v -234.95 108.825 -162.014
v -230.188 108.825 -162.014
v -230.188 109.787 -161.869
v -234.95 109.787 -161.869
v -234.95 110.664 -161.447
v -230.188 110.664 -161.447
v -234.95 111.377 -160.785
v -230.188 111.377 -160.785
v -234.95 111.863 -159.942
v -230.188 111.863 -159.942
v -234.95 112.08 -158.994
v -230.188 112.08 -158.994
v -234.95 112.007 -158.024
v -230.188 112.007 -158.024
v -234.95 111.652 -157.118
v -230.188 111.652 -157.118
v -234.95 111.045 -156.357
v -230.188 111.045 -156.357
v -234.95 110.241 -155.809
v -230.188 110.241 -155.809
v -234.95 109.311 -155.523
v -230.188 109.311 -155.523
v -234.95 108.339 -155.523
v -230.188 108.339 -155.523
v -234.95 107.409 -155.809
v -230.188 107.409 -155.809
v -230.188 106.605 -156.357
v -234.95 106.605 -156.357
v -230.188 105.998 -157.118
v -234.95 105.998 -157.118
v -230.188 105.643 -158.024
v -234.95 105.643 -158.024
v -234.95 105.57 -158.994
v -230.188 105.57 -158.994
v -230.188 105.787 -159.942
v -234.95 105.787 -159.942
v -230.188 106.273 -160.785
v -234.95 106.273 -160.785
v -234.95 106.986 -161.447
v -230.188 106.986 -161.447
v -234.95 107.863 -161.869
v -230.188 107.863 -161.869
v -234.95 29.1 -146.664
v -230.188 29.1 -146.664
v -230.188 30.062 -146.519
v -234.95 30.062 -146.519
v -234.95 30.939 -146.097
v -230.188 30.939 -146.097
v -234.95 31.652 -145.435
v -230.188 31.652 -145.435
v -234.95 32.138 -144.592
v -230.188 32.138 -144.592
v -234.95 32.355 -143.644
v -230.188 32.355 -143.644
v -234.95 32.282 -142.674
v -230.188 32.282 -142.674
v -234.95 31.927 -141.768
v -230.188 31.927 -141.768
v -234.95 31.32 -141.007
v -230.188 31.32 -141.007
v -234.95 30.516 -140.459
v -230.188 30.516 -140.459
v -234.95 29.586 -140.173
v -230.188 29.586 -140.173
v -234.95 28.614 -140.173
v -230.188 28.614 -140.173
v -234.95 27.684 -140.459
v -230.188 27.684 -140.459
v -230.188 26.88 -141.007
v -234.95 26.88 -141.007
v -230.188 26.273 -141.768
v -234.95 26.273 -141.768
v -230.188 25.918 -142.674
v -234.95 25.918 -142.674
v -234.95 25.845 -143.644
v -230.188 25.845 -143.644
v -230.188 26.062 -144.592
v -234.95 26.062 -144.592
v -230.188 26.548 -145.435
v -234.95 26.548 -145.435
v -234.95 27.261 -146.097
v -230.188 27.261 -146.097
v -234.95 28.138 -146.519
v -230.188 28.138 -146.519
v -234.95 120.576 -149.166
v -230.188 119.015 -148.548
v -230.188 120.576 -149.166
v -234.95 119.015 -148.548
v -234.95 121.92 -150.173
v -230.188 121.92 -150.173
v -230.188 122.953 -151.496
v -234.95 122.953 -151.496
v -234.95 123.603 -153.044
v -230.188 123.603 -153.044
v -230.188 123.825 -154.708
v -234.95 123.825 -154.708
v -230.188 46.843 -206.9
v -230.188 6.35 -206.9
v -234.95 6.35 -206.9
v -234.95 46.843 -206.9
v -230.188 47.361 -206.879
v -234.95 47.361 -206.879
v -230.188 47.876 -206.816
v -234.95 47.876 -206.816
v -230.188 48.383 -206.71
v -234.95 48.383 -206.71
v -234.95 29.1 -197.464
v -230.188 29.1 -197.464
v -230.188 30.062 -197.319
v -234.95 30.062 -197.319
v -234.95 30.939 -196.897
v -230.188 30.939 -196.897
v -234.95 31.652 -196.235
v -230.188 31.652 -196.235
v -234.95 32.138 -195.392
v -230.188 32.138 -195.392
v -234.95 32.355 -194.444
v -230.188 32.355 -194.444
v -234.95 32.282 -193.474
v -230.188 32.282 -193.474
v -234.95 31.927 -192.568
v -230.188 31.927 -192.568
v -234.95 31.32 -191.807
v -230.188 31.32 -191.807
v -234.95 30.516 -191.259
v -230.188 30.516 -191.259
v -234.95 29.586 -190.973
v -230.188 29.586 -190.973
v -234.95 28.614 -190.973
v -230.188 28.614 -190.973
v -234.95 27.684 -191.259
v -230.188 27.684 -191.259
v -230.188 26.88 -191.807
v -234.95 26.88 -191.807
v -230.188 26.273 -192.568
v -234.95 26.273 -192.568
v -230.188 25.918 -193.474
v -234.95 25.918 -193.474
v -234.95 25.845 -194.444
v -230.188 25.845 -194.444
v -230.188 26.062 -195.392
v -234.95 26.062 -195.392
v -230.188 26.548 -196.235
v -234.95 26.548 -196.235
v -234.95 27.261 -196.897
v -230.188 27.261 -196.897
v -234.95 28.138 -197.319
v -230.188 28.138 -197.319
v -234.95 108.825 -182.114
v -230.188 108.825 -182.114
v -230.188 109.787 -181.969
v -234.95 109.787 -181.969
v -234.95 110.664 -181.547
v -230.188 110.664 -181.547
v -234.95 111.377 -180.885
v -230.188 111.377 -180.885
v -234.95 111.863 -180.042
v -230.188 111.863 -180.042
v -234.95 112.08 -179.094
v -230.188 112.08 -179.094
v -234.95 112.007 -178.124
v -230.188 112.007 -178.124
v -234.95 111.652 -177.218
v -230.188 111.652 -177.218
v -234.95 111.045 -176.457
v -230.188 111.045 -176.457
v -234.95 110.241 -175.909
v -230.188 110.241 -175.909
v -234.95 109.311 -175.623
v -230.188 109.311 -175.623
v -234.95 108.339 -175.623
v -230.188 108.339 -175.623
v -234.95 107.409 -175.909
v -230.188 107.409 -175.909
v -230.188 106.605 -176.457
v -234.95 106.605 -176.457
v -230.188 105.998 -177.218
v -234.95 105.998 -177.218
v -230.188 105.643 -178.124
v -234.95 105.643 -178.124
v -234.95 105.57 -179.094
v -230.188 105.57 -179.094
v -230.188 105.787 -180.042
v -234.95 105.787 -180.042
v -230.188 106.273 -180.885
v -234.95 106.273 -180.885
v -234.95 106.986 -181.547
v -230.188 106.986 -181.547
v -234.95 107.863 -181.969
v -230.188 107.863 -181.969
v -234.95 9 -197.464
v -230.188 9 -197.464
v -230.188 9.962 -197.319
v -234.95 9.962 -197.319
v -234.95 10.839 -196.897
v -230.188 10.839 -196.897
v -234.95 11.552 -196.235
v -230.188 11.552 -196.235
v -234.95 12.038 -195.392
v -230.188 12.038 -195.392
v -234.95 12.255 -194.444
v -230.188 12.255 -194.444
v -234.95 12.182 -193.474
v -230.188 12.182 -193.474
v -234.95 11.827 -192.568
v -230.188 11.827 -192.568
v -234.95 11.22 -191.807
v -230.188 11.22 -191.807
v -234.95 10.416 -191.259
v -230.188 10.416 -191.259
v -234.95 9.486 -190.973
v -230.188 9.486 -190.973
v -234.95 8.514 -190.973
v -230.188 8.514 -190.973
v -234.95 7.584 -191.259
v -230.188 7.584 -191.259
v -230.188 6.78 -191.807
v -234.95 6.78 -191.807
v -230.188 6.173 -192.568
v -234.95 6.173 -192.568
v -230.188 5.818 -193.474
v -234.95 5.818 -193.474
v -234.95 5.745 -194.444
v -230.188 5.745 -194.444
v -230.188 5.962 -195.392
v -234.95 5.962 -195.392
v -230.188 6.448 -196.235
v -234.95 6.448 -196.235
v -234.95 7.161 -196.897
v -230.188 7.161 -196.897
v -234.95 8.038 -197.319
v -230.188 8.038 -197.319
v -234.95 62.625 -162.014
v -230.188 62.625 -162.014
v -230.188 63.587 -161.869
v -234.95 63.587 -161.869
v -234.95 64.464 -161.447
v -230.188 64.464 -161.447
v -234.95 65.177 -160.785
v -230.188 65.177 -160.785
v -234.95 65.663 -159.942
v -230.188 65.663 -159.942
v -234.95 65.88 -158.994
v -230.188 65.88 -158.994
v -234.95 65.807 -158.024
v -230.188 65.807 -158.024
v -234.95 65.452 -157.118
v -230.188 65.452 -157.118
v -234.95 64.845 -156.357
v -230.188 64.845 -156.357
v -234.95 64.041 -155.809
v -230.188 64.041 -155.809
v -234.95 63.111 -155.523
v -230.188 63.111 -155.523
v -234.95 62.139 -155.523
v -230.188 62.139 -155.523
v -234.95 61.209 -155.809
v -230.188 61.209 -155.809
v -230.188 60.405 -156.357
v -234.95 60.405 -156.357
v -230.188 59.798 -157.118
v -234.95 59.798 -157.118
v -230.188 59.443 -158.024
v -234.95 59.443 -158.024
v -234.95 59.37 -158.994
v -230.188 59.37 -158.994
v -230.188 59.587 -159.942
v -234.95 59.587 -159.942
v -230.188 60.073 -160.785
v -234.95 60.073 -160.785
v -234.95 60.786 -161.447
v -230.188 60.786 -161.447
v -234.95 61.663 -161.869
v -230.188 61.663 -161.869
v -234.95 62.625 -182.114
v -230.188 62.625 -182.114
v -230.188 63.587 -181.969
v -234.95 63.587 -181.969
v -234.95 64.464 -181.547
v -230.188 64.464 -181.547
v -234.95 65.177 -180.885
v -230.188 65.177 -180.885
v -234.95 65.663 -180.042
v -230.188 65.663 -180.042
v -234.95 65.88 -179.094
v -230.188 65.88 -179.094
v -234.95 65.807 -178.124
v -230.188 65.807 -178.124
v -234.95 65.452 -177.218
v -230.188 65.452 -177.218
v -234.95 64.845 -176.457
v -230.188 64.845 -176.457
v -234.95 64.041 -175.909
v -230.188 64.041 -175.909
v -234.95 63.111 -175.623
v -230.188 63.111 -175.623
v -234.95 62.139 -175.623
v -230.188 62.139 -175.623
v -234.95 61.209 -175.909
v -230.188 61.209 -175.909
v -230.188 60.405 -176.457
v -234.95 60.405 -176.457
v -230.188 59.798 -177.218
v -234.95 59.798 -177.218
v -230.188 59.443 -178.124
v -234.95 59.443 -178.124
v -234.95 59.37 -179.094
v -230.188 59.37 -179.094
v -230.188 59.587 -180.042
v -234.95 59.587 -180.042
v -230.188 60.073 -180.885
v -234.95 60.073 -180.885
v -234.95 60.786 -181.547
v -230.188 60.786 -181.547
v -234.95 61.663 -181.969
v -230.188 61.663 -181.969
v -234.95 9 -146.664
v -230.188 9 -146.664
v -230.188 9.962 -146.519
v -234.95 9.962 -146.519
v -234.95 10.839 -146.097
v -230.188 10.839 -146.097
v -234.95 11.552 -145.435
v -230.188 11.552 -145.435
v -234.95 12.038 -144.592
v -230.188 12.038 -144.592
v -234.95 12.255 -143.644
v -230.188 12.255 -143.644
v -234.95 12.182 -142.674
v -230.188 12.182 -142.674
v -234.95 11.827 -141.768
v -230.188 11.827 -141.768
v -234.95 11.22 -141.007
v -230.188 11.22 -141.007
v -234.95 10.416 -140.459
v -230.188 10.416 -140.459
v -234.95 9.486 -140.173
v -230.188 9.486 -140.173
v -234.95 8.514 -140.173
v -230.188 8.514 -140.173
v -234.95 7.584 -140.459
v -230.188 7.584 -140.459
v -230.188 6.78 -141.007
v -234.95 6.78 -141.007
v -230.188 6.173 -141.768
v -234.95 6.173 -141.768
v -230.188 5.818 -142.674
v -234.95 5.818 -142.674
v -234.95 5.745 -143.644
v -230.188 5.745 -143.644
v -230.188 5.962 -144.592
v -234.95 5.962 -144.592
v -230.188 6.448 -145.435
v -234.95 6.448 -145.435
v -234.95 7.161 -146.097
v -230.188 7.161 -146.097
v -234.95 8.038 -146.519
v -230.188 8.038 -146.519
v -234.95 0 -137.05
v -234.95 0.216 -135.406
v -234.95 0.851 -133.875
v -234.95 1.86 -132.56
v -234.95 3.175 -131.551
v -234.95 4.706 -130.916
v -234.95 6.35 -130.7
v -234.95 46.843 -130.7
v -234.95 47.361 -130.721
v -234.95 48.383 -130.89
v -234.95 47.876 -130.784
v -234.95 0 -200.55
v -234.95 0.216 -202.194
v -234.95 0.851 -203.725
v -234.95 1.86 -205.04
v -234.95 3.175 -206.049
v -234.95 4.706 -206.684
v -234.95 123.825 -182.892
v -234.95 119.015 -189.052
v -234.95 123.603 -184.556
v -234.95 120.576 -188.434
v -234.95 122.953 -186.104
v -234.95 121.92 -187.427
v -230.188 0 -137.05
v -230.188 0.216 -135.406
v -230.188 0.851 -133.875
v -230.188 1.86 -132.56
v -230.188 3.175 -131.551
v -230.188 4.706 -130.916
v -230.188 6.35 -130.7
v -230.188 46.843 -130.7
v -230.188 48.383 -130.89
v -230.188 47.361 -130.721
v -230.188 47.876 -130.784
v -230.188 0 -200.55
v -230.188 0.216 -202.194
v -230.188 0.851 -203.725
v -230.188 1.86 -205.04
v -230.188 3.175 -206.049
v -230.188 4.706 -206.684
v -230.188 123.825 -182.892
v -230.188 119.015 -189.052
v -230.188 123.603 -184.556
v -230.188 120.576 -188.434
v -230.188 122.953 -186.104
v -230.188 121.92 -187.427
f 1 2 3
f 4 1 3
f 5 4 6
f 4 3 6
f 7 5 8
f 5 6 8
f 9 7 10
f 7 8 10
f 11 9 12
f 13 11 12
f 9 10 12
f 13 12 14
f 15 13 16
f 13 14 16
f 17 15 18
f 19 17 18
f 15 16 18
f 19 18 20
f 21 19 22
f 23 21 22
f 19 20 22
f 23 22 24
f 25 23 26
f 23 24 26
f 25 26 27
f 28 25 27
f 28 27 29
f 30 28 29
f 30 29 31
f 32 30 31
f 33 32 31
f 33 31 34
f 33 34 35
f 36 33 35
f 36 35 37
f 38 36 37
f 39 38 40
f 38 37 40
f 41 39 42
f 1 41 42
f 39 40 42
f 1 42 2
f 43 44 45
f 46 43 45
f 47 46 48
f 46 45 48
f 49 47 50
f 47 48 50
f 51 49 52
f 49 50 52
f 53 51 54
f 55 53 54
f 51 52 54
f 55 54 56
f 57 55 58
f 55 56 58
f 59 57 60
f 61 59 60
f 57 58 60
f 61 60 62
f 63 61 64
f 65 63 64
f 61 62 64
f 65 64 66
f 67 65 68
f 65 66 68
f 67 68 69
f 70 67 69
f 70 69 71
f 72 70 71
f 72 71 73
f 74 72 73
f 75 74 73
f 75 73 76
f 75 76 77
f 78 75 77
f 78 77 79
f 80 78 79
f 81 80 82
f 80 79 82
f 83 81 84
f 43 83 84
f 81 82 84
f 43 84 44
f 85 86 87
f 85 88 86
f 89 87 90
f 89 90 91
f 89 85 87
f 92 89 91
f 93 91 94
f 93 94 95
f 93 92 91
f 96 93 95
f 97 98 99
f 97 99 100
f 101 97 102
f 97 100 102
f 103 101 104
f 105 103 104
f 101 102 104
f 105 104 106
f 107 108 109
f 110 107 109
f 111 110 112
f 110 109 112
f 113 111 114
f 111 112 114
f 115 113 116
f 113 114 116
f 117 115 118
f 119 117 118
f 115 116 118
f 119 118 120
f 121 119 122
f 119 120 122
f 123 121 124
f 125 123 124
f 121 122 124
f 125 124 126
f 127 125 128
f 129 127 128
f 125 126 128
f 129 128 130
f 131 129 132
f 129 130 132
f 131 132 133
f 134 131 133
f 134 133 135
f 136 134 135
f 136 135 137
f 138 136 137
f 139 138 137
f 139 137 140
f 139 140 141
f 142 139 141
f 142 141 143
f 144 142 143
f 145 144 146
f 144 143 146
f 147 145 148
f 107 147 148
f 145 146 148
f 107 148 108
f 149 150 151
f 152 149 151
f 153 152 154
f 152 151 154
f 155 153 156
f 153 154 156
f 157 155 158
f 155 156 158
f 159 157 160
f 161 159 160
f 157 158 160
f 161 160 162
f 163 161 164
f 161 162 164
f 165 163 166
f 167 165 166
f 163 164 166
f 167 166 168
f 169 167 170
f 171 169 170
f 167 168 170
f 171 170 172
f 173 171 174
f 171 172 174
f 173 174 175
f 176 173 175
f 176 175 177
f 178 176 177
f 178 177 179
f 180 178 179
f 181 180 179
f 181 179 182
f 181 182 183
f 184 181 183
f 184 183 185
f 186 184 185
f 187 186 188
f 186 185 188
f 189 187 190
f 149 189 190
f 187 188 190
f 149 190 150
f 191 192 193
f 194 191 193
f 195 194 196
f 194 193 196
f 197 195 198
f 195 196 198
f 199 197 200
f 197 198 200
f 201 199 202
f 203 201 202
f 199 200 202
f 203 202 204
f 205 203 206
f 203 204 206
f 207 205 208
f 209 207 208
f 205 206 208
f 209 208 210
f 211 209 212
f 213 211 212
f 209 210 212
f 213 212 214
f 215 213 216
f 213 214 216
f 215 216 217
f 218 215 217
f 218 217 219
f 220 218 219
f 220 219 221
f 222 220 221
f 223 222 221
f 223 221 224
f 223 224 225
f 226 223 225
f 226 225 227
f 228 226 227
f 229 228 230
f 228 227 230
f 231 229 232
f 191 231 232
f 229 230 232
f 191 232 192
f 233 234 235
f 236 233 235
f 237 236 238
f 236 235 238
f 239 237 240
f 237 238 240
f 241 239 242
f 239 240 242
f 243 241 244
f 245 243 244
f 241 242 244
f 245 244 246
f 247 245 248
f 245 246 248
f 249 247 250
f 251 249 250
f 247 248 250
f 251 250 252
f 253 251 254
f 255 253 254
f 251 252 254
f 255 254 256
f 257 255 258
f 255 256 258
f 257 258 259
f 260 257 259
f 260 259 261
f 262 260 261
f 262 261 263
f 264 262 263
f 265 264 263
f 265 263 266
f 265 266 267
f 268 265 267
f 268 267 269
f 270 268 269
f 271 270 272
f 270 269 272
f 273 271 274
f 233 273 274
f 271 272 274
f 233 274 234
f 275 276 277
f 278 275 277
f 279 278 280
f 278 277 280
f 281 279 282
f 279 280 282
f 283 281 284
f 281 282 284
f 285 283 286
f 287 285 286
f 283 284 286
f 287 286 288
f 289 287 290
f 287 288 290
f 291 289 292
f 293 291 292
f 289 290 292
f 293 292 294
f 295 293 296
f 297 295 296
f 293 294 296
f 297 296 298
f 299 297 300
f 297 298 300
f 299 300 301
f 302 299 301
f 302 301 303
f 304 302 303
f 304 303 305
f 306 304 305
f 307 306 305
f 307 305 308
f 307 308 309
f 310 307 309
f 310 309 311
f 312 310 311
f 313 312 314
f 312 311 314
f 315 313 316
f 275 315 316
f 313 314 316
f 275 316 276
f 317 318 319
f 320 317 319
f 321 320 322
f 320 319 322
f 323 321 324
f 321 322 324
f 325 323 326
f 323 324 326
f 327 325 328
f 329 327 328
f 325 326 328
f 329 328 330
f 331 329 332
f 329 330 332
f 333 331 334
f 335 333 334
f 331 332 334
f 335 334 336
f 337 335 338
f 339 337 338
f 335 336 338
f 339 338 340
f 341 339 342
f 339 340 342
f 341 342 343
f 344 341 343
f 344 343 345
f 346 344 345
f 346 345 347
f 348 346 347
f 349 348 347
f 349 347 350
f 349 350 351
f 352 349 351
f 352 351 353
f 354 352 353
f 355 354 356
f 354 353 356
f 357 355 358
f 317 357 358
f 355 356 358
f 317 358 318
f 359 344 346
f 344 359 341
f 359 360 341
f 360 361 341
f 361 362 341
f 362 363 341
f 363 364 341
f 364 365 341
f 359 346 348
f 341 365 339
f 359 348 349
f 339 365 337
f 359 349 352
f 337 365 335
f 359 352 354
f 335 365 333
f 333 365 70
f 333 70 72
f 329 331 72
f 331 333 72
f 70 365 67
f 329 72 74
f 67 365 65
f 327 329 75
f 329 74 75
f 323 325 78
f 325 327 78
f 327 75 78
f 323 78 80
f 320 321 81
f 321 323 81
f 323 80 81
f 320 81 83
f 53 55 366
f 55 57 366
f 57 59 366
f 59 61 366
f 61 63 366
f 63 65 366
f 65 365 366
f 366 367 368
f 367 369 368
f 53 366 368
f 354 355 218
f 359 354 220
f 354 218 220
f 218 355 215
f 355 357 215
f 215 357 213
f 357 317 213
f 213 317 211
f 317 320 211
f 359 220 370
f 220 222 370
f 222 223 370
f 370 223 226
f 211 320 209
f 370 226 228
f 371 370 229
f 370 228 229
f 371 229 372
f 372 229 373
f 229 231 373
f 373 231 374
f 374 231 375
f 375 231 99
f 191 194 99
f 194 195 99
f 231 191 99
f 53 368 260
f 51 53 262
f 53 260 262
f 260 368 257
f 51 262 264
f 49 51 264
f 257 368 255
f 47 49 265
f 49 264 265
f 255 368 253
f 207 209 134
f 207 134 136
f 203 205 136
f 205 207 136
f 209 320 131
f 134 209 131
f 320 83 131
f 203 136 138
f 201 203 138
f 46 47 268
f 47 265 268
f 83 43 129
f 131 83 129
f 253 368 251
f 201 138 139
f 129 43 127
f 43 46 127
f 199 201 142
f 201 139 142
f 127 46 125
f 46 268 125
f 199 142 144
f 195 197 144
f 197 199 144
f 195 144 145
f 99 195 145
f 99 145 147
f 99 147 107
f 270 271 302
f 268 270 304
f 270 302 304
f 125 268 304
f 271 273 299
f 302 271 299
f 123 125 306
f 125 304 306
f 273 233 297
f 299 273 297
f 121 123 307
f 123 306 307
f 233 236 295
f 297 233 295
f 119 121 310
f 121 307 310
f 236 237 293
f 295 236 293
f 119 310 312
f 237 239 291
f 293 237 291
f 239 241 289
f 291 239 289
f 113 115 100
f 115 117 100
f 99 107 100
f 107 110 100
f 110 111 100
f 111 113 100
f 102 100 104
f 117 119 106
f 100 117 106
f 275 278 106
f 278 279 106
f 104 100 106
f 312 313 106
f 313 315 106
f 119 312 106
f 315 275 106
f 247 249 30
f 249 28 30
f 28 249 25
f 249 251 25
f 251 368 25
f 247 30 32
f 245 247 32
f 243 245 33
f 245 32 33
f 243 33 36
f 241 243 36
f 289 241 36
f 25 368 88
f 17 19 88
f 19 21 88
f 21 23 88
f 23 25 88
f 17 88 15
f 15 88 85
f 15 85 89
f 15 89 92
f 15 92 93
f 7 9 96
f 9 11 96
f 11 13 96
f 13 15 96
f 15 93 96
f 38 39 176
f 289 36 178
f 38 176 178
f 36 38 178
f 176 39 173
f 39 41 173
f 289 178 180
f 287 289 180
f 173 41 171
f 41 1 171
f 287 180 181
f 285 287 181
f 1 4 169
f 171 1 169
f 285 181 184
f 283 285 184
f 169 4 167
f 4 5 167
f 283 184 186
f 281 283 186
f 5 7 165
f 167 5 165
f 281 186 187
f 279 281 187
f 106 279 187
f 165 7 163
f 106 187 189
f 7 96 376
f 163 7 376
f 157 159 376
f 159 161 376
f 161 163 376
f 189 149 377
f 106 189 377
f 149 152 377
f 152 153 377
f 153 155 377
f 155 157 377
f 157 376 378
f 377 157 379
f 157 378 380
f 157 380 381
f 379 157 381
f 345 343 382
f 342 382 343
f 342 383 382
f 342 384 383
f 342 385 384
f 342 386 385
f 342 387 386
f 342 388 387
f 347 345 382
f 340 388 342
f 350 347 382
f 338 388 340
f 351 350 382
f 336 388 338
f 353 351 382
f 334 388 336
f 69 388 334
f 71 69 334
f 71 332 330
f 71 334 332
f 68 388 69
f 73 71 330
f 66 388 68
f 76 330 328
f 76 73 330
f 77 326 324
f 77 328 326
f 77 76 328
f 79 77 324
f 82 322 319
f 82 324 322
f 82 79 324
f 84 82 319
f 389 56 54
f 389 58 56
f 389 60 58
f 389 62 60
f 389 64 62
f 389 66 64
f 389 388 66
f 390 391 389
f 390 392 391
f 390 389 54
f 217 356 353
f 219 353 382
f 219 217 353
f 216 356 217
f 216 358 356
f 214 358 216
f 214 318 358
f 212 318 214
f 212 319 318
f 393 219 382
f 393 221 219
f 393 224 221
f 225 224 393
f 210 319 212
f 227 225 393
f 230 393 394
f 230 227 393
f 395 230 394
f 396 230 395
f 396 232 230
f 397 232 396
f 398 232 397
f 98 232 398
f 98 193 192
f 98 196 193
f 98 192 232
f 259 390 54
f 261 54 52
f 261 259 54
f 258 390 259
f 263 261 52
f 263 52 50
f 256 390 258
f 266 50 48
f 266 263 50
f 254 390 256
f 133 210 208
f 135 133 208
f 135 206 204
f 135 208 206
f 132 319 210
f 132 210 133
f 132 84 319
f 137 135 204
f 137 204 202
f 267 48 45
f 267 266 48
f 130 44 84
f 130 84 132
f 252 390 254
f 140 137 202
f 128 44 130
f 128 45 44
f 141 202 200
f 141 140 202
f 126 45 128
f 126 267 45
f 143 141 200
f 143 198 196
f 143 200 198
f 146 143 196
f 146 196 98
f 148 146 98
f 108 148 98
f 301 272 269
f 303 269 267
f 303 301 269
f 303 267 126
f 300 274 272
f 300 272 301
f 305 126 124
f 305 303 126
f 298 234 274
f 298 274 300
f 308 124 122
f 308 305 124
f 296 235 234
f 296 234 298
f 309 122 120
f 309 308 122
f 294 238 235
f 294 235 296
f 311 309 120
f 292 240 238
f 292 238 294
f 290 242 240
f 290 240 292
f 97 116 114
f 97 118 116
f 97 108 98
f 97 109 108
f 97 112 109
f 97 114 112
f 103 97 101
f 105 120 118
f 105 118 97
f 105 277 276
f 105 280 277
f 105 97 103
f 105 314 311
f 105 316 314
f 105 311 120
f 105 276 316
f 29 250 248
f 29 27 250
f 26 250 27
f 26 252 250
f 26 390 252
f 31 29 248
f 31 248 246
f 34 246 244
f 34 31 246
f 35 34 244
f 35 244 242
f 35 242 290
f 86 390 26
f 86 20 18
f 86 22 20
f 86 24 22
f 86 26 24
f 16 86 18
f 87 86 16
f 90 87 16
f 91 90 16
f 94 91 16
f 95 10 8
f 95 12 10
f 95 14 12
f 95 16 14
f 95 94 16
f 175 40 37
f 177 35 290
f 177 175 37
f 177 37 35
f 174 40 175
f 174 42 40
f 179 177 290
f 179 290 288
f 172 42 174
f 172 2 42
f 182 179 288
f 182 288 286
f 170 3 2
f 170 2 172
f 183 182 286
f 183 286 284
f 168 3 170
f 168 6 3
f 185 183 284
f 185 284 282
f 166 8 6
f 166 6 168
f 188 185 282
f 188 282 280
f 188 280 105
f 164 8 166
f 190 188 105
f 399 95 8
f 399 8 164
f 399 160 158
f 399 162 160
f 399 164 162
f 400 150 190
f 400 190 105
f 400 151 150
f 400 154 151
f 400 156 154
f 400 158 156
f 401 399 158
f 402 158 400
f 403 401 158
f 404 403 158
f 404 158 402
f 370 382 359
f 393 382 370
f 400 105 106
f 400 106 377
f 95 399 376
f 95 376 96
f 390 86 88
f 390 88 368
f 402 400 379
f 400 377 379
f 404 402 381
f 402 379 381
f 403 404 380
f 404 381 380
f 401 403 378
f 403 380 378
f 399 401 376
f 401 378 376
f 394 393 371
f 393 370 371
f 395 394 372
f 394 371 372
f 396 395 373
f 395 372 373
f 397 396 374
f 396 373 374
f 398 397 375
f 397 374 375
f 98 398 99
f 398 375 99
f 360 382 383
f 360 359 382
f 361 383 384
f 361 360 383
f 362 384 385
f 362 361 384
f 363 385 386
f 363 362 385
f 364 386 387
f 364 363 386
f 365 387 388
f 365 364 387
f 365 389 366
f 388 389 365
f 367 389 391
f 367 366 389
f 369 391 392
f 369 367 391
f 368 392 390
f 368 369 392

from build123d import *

# Parameters (mm, degrees)
SKETCH1_R           = 3.2639
BOSS_EXTRUDE1_DEPTH = 4.7625
FILLET1_R           = 6.35


with BuildPart() as part:
    # Sketch1 → Boss-Extrude1 (new body)
    with BuildSketch(Plane(origin=(-230.1875, 0, 0), x_dir=(0, 0, -1), z_dir=(1, 0, 0))):
        Polygon((130.7, 0), (206.9, 0), (206.9, 47.625), (187.85, 123.825), (149.75, 123.825), (130.7, 47.625), align=None)
        with Locations((194.2, 29.1)):
            Circle(SKETCH1_R, mode=Mode.SUBTRACT)
        with Locations((158.75, 108.825000028)):
            Circle(SKETCH1_R, mode=Mode.SUBTRACT)
        with Locations((178.85, 108.825000028)):
            Circle(SKETCH1_R, mode=Mode.SUBTRACT)
        with Locations((178.85, 62.625)):
            Circle(SKETCH1_R, mode=Mode.SUBTRACT)
        with Locations((158.75, 62.625)):
            Circle(SKETCH1_R, mode=Mode.SUBTRACT)
        with Locations((143.4, 29.1)):
            Circle(SKETCH1_R, mode=Mode.SUBTRACT)
        with Locations((143.4, 9)):
            Circle(SKETCH1_R, mode=Mode.SUBTRACT)
        with Locations((194.2, 9)):
            Circle(SKETCH1_R, mode=Mode.SUBTRACT)
    extrude(amount=-BOSS_EXTRUDE1_DEPTH)

    # Fillet1
    fillet1_edges = [part.edges().sort_by_distance(p)[0] for p in [
        (-232.56875, 0, -130.7),
        (-232.56875, 0, -206.9),
        (-232.56875, 47.625, -206.9),
        (-232.56875, 47.625, -130.7),
        (-232.56875, 123.825, -187.85),
        (-232.56875, 123.825, -149.75),
    ]]
    fillet(fillet1_edges, radius=FILLET1_R)


solid = part.part
